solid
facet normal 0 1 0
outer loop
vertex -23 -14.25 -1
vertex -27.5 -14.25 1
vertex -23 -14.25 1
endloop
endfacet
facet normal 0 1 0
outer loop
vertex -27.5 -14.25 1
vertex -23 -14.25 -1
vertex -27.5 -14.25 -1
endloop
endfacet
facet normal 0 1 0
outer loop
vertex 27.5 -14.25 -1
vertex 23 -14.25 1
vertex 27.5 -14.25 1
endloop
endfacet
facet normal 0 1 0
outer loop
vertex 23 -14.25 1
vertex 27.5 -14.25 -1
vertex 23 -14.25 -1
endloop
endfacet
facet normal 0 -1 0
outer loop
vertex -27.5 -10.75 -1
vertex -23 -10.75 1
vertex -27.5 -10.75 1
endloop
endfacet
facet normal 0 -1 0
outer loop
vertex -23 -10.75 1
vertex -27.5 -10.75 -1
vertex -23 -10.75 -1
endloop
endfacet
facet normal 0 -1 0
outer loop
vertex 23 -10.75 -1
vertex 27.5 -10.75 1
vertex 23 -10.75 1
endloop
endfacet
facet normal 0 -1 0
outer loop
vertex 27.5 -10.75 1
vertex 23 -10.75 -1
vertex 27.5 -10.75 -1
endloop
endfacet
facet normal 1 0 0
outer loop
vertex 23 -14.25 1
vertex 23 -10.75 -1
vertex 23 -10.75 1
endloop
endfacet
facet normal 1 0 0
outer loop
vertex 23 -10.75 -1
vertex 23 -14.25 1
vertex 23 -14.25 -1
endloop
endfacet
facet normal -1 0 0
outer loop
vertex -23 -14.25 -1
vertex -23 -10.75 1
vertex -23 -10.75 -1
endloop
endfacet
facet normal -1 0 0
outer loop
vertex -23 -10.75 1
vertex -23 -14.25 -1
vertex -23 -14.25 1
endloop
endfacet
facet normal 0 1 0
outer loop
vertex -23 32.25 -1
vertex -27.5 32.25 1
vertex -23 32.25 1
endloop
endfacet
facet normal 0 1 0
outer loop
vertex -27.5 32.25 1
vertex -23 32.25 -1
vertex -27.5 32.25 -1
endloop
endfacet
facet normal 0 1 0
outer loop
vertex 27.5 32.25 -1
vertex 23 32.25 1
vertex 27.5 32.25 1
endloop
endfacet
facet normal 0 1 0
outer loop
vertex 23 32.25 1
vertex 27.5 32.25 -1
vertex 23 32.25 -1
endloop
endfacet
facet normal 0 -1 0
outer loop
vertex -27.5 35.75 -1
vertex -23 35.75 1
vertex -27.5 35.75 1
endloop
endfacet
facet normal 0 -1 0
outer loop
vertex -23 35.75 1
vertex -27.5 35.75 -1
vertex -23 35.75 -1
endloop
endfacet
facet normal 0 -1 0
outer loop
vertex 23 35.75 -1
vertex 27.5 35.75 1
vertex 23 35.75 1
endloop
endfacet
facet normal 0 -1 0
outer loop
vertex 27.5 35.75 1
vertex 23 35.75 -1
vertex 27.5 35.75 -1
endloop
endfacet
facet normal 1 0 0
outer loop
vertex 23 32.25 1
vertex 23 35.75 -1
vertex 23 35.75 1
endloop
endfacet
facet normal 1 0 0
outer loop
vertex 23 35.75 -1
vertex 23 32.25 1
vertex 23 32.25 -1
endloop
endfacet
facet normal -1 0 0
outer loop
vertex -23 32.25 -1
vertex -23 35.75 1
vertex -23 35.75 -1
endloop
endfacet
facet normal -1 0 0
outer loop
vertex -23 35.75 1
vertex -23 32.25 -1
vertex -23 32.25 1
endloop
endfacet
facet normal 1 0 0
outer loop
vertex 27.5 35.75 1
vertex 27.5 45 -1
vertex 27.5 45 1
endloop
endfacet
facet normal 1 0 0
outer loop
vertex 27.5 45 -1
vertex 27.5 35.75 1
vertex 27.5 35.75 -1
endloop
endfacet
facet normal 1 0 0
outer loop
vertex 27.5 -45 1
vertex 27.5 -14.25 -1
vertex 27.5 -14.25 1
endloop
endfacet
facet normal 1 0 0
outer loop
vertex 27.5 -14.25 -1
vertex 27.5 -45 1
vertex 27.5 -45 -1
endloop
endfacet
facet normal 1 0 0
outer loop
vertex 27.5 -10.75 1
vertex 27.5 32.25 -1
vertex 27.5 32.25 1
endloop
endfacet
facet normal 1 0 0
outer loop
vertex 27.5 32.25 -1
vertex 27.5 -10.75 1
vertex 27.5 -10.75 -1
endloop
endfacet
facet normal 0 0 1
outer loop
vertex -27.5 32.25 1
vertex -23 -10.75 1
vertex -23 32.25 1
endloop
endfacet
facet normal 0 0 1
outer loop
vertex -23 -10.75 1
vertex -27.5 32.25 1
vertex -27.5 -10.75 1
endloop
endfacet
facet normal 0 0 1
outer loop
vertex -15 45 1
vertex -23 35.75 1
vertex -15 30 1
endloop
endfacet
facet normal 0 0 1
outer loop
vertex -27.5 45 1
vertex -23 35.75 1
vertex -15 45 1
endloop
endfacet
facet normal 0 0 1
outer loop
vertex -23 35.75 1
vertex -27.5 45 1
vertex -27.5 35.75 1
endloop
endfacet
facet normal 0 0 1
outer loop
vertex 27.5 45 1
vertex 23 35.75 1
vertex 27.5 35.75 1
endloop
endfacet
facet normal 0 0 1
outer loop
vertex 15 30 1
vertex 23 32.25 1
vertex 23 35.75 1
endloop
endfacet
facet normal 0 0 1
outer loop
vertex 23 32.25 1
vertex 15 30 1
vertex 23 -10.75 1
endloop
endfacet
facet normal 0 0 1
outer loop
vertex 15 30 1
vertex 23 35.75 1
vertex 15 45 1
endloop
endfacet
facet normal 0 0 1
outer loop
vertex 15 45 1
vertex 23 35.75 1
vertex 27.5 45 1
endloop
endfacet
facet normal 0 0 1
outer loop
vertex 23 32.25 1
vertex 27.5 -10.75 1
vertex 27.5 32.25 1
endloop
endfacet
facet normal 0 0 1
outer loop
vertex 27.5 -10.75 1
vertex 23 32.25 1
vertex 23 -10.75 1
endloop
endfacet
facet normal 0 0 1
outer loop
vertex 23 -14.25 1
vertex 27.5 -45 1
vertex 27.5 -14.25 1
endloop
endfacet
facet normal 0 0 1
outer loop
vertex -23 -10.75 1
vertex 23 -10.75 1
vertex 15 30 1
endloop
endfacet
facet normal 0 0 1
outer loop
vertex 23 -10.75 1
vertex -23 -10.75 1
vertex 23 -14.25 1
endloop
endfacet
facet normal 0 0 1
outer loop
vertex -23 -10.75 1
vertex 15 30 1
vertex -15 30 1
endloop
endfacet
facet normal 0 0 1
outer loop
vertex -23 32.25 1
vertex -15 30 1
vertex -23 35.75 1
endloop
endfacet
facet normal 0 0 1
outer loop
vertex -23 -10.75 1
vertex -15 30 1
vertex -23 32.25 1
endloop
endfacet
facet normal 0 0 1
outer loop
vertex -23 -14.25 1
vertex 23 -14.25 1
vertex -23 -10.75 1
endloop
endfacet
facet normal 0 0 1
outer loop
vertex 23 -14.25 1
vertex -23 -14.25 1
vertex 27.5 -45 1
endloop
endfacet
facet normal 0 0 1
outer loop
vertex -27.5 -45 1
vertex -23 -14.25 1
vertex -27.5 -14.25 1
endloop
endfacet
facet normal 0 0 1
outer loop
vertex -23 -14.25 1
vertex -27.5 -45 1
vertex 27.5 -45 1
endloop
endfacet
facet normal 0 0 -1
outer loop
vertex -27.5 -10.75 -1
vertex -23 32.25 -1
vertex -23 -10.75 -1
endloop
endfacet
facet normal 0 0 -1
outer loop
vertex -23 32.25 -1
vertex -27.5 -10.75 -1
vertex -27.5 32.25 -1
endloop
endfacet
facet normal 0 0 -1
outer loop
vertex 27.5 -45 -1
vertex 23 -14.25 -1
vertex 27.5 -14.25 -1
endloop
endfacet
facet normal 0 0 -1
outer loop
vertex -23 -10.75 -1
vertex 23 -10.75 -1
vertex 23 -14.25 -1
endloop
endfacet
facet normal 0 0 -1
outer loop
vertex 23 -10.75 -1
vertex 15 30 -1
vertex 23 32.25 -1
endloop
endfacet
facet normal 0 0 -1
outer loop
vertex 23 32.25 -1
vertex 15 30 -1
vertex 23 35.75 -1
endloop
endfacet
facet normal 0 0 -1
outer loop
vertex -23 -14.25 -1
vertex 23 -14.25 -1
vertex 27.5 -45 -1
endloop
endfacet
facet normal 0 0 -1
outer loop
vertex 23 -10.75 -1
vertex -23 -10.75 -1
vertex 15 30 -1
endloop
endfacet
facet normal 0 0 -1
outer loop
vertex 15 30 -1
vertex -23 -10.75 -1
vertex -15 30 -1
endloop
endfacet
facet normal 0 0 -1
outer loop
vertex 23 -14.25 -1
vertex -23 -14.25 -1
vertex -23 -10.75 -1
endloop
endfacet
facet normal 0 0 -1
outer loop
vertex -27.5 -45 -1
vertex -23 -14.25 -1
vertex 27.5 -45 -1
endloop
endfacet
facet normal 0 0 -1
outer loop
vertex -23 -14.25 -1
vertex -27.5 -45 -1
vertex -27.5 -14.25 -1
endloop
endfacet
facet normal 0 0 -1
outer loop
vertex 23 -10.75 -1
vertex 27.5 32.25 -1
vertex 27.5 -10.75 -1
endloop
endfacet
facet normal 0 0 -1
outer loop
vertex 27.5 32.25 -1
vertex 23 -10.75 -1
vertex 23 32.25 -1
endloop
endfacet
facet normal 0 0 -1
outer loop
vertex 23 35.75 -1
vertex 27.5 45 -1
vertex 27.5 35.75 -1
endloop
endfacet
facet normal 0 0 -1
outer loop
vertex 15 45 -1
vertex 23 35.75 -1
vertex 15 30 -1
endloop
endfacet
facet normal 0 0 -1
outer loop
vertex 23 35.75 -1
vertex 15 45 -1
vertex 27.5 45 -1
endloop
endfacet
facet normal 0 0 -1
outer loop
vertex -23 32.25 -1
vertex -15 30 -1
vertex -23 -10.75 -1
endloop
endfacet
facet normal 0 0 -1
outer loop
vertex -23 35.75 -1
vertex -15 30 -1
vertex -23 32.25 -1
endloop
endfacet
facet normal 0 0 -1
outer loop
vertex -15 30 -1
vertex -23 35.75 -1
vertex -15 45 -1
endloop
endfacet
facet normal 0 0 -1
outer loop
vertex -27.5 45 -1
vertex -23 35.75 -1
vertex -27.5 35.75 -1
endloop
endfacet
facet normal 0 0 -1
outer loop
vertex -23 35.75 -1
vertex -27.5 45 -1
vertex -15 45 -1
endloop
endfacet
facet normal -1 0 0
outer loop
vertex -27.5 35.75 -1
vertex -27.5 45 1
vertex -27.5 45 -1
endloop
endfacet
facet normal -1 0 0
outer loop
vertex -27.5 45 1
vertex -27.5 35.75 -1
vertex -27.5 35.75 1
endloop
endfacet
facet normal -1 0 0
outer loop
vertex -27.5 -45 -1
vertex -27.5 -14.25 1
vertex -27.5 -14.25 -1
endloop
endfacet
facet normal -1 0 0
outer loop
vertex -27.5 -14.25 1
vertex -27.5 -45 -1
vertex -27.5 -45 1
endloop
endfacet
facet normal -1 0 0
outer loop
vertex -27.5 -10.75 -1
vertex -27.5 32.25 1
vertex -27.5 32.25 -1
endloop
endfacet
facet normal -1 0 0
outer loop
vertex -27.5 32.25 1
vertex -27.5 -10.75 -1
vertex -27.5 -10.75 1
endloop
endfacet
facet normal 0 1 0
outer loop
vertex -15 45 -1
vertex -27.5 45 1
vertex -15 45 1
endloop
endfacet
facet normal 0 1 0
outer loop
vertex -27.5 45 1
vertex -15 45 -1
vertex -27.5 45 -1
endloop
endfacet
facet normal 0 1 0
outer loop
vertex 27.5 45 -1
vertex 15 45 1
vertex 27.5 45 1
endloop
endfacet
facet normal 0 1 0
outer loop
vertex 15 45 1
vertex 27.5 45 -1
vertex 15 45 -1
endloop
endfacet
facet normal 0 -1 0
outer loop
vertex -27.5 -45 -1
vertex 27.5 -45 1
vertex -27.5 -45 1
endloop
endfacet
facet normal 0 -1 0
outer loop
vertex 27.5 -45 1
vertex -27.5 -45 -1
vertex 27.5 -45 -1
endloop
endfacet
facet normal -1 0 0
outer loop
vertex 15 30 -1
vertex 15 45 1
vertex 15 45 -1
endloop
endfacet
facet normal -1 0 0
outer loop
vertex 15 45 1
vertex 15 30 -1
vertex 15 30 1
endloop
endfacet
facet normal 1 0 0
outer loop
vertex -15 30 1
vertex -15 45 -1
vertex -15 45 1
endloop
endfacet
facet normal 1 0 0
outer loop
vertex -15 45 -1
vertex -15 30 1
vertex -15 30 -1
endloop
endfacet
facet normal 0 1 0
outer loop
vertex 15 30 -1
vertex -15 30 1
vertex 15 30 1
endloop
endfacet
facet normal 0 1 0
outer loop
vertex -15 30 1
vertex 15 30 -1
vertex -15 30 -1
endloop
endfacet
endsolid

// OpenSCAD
 module halfcircle(h)
{
	difference()
	{
		cylinder(h, r=35, center=true);
		translate([0, -35, 0])
			cube([70, 35, h+1], center=true);
	}
}

module horseshoe(height)
{
	difference()
	{
		halfcircle(height);
		union()
		{
		   translate([0, -20, 0])
			cube([50, 60, height+1], center=true);
		   translate([0, 5, 0])
			cylinder(height+10, r=25, center=true);
		}
	}
}

module mount(height)
{
	difference()
	{
		scale([0.92, 0.92, 1])
		horseshoe(height);
		translate([0, -10, 0])
		cube([56.5, 1.8, 100], center=true);		
	}
}

difference()
{
	cube([55, 90, 2], center=true);
	translate([0, -12.5, 0])
	rotate([90, 0, 0])
	mount(3.5);
	translate([0, 34.0, 0])
	rotate([90, 0, 0])
	mount(3.5);
	translate([0, 38, 0])
	cube([30, 16, 3], center=true);
}
